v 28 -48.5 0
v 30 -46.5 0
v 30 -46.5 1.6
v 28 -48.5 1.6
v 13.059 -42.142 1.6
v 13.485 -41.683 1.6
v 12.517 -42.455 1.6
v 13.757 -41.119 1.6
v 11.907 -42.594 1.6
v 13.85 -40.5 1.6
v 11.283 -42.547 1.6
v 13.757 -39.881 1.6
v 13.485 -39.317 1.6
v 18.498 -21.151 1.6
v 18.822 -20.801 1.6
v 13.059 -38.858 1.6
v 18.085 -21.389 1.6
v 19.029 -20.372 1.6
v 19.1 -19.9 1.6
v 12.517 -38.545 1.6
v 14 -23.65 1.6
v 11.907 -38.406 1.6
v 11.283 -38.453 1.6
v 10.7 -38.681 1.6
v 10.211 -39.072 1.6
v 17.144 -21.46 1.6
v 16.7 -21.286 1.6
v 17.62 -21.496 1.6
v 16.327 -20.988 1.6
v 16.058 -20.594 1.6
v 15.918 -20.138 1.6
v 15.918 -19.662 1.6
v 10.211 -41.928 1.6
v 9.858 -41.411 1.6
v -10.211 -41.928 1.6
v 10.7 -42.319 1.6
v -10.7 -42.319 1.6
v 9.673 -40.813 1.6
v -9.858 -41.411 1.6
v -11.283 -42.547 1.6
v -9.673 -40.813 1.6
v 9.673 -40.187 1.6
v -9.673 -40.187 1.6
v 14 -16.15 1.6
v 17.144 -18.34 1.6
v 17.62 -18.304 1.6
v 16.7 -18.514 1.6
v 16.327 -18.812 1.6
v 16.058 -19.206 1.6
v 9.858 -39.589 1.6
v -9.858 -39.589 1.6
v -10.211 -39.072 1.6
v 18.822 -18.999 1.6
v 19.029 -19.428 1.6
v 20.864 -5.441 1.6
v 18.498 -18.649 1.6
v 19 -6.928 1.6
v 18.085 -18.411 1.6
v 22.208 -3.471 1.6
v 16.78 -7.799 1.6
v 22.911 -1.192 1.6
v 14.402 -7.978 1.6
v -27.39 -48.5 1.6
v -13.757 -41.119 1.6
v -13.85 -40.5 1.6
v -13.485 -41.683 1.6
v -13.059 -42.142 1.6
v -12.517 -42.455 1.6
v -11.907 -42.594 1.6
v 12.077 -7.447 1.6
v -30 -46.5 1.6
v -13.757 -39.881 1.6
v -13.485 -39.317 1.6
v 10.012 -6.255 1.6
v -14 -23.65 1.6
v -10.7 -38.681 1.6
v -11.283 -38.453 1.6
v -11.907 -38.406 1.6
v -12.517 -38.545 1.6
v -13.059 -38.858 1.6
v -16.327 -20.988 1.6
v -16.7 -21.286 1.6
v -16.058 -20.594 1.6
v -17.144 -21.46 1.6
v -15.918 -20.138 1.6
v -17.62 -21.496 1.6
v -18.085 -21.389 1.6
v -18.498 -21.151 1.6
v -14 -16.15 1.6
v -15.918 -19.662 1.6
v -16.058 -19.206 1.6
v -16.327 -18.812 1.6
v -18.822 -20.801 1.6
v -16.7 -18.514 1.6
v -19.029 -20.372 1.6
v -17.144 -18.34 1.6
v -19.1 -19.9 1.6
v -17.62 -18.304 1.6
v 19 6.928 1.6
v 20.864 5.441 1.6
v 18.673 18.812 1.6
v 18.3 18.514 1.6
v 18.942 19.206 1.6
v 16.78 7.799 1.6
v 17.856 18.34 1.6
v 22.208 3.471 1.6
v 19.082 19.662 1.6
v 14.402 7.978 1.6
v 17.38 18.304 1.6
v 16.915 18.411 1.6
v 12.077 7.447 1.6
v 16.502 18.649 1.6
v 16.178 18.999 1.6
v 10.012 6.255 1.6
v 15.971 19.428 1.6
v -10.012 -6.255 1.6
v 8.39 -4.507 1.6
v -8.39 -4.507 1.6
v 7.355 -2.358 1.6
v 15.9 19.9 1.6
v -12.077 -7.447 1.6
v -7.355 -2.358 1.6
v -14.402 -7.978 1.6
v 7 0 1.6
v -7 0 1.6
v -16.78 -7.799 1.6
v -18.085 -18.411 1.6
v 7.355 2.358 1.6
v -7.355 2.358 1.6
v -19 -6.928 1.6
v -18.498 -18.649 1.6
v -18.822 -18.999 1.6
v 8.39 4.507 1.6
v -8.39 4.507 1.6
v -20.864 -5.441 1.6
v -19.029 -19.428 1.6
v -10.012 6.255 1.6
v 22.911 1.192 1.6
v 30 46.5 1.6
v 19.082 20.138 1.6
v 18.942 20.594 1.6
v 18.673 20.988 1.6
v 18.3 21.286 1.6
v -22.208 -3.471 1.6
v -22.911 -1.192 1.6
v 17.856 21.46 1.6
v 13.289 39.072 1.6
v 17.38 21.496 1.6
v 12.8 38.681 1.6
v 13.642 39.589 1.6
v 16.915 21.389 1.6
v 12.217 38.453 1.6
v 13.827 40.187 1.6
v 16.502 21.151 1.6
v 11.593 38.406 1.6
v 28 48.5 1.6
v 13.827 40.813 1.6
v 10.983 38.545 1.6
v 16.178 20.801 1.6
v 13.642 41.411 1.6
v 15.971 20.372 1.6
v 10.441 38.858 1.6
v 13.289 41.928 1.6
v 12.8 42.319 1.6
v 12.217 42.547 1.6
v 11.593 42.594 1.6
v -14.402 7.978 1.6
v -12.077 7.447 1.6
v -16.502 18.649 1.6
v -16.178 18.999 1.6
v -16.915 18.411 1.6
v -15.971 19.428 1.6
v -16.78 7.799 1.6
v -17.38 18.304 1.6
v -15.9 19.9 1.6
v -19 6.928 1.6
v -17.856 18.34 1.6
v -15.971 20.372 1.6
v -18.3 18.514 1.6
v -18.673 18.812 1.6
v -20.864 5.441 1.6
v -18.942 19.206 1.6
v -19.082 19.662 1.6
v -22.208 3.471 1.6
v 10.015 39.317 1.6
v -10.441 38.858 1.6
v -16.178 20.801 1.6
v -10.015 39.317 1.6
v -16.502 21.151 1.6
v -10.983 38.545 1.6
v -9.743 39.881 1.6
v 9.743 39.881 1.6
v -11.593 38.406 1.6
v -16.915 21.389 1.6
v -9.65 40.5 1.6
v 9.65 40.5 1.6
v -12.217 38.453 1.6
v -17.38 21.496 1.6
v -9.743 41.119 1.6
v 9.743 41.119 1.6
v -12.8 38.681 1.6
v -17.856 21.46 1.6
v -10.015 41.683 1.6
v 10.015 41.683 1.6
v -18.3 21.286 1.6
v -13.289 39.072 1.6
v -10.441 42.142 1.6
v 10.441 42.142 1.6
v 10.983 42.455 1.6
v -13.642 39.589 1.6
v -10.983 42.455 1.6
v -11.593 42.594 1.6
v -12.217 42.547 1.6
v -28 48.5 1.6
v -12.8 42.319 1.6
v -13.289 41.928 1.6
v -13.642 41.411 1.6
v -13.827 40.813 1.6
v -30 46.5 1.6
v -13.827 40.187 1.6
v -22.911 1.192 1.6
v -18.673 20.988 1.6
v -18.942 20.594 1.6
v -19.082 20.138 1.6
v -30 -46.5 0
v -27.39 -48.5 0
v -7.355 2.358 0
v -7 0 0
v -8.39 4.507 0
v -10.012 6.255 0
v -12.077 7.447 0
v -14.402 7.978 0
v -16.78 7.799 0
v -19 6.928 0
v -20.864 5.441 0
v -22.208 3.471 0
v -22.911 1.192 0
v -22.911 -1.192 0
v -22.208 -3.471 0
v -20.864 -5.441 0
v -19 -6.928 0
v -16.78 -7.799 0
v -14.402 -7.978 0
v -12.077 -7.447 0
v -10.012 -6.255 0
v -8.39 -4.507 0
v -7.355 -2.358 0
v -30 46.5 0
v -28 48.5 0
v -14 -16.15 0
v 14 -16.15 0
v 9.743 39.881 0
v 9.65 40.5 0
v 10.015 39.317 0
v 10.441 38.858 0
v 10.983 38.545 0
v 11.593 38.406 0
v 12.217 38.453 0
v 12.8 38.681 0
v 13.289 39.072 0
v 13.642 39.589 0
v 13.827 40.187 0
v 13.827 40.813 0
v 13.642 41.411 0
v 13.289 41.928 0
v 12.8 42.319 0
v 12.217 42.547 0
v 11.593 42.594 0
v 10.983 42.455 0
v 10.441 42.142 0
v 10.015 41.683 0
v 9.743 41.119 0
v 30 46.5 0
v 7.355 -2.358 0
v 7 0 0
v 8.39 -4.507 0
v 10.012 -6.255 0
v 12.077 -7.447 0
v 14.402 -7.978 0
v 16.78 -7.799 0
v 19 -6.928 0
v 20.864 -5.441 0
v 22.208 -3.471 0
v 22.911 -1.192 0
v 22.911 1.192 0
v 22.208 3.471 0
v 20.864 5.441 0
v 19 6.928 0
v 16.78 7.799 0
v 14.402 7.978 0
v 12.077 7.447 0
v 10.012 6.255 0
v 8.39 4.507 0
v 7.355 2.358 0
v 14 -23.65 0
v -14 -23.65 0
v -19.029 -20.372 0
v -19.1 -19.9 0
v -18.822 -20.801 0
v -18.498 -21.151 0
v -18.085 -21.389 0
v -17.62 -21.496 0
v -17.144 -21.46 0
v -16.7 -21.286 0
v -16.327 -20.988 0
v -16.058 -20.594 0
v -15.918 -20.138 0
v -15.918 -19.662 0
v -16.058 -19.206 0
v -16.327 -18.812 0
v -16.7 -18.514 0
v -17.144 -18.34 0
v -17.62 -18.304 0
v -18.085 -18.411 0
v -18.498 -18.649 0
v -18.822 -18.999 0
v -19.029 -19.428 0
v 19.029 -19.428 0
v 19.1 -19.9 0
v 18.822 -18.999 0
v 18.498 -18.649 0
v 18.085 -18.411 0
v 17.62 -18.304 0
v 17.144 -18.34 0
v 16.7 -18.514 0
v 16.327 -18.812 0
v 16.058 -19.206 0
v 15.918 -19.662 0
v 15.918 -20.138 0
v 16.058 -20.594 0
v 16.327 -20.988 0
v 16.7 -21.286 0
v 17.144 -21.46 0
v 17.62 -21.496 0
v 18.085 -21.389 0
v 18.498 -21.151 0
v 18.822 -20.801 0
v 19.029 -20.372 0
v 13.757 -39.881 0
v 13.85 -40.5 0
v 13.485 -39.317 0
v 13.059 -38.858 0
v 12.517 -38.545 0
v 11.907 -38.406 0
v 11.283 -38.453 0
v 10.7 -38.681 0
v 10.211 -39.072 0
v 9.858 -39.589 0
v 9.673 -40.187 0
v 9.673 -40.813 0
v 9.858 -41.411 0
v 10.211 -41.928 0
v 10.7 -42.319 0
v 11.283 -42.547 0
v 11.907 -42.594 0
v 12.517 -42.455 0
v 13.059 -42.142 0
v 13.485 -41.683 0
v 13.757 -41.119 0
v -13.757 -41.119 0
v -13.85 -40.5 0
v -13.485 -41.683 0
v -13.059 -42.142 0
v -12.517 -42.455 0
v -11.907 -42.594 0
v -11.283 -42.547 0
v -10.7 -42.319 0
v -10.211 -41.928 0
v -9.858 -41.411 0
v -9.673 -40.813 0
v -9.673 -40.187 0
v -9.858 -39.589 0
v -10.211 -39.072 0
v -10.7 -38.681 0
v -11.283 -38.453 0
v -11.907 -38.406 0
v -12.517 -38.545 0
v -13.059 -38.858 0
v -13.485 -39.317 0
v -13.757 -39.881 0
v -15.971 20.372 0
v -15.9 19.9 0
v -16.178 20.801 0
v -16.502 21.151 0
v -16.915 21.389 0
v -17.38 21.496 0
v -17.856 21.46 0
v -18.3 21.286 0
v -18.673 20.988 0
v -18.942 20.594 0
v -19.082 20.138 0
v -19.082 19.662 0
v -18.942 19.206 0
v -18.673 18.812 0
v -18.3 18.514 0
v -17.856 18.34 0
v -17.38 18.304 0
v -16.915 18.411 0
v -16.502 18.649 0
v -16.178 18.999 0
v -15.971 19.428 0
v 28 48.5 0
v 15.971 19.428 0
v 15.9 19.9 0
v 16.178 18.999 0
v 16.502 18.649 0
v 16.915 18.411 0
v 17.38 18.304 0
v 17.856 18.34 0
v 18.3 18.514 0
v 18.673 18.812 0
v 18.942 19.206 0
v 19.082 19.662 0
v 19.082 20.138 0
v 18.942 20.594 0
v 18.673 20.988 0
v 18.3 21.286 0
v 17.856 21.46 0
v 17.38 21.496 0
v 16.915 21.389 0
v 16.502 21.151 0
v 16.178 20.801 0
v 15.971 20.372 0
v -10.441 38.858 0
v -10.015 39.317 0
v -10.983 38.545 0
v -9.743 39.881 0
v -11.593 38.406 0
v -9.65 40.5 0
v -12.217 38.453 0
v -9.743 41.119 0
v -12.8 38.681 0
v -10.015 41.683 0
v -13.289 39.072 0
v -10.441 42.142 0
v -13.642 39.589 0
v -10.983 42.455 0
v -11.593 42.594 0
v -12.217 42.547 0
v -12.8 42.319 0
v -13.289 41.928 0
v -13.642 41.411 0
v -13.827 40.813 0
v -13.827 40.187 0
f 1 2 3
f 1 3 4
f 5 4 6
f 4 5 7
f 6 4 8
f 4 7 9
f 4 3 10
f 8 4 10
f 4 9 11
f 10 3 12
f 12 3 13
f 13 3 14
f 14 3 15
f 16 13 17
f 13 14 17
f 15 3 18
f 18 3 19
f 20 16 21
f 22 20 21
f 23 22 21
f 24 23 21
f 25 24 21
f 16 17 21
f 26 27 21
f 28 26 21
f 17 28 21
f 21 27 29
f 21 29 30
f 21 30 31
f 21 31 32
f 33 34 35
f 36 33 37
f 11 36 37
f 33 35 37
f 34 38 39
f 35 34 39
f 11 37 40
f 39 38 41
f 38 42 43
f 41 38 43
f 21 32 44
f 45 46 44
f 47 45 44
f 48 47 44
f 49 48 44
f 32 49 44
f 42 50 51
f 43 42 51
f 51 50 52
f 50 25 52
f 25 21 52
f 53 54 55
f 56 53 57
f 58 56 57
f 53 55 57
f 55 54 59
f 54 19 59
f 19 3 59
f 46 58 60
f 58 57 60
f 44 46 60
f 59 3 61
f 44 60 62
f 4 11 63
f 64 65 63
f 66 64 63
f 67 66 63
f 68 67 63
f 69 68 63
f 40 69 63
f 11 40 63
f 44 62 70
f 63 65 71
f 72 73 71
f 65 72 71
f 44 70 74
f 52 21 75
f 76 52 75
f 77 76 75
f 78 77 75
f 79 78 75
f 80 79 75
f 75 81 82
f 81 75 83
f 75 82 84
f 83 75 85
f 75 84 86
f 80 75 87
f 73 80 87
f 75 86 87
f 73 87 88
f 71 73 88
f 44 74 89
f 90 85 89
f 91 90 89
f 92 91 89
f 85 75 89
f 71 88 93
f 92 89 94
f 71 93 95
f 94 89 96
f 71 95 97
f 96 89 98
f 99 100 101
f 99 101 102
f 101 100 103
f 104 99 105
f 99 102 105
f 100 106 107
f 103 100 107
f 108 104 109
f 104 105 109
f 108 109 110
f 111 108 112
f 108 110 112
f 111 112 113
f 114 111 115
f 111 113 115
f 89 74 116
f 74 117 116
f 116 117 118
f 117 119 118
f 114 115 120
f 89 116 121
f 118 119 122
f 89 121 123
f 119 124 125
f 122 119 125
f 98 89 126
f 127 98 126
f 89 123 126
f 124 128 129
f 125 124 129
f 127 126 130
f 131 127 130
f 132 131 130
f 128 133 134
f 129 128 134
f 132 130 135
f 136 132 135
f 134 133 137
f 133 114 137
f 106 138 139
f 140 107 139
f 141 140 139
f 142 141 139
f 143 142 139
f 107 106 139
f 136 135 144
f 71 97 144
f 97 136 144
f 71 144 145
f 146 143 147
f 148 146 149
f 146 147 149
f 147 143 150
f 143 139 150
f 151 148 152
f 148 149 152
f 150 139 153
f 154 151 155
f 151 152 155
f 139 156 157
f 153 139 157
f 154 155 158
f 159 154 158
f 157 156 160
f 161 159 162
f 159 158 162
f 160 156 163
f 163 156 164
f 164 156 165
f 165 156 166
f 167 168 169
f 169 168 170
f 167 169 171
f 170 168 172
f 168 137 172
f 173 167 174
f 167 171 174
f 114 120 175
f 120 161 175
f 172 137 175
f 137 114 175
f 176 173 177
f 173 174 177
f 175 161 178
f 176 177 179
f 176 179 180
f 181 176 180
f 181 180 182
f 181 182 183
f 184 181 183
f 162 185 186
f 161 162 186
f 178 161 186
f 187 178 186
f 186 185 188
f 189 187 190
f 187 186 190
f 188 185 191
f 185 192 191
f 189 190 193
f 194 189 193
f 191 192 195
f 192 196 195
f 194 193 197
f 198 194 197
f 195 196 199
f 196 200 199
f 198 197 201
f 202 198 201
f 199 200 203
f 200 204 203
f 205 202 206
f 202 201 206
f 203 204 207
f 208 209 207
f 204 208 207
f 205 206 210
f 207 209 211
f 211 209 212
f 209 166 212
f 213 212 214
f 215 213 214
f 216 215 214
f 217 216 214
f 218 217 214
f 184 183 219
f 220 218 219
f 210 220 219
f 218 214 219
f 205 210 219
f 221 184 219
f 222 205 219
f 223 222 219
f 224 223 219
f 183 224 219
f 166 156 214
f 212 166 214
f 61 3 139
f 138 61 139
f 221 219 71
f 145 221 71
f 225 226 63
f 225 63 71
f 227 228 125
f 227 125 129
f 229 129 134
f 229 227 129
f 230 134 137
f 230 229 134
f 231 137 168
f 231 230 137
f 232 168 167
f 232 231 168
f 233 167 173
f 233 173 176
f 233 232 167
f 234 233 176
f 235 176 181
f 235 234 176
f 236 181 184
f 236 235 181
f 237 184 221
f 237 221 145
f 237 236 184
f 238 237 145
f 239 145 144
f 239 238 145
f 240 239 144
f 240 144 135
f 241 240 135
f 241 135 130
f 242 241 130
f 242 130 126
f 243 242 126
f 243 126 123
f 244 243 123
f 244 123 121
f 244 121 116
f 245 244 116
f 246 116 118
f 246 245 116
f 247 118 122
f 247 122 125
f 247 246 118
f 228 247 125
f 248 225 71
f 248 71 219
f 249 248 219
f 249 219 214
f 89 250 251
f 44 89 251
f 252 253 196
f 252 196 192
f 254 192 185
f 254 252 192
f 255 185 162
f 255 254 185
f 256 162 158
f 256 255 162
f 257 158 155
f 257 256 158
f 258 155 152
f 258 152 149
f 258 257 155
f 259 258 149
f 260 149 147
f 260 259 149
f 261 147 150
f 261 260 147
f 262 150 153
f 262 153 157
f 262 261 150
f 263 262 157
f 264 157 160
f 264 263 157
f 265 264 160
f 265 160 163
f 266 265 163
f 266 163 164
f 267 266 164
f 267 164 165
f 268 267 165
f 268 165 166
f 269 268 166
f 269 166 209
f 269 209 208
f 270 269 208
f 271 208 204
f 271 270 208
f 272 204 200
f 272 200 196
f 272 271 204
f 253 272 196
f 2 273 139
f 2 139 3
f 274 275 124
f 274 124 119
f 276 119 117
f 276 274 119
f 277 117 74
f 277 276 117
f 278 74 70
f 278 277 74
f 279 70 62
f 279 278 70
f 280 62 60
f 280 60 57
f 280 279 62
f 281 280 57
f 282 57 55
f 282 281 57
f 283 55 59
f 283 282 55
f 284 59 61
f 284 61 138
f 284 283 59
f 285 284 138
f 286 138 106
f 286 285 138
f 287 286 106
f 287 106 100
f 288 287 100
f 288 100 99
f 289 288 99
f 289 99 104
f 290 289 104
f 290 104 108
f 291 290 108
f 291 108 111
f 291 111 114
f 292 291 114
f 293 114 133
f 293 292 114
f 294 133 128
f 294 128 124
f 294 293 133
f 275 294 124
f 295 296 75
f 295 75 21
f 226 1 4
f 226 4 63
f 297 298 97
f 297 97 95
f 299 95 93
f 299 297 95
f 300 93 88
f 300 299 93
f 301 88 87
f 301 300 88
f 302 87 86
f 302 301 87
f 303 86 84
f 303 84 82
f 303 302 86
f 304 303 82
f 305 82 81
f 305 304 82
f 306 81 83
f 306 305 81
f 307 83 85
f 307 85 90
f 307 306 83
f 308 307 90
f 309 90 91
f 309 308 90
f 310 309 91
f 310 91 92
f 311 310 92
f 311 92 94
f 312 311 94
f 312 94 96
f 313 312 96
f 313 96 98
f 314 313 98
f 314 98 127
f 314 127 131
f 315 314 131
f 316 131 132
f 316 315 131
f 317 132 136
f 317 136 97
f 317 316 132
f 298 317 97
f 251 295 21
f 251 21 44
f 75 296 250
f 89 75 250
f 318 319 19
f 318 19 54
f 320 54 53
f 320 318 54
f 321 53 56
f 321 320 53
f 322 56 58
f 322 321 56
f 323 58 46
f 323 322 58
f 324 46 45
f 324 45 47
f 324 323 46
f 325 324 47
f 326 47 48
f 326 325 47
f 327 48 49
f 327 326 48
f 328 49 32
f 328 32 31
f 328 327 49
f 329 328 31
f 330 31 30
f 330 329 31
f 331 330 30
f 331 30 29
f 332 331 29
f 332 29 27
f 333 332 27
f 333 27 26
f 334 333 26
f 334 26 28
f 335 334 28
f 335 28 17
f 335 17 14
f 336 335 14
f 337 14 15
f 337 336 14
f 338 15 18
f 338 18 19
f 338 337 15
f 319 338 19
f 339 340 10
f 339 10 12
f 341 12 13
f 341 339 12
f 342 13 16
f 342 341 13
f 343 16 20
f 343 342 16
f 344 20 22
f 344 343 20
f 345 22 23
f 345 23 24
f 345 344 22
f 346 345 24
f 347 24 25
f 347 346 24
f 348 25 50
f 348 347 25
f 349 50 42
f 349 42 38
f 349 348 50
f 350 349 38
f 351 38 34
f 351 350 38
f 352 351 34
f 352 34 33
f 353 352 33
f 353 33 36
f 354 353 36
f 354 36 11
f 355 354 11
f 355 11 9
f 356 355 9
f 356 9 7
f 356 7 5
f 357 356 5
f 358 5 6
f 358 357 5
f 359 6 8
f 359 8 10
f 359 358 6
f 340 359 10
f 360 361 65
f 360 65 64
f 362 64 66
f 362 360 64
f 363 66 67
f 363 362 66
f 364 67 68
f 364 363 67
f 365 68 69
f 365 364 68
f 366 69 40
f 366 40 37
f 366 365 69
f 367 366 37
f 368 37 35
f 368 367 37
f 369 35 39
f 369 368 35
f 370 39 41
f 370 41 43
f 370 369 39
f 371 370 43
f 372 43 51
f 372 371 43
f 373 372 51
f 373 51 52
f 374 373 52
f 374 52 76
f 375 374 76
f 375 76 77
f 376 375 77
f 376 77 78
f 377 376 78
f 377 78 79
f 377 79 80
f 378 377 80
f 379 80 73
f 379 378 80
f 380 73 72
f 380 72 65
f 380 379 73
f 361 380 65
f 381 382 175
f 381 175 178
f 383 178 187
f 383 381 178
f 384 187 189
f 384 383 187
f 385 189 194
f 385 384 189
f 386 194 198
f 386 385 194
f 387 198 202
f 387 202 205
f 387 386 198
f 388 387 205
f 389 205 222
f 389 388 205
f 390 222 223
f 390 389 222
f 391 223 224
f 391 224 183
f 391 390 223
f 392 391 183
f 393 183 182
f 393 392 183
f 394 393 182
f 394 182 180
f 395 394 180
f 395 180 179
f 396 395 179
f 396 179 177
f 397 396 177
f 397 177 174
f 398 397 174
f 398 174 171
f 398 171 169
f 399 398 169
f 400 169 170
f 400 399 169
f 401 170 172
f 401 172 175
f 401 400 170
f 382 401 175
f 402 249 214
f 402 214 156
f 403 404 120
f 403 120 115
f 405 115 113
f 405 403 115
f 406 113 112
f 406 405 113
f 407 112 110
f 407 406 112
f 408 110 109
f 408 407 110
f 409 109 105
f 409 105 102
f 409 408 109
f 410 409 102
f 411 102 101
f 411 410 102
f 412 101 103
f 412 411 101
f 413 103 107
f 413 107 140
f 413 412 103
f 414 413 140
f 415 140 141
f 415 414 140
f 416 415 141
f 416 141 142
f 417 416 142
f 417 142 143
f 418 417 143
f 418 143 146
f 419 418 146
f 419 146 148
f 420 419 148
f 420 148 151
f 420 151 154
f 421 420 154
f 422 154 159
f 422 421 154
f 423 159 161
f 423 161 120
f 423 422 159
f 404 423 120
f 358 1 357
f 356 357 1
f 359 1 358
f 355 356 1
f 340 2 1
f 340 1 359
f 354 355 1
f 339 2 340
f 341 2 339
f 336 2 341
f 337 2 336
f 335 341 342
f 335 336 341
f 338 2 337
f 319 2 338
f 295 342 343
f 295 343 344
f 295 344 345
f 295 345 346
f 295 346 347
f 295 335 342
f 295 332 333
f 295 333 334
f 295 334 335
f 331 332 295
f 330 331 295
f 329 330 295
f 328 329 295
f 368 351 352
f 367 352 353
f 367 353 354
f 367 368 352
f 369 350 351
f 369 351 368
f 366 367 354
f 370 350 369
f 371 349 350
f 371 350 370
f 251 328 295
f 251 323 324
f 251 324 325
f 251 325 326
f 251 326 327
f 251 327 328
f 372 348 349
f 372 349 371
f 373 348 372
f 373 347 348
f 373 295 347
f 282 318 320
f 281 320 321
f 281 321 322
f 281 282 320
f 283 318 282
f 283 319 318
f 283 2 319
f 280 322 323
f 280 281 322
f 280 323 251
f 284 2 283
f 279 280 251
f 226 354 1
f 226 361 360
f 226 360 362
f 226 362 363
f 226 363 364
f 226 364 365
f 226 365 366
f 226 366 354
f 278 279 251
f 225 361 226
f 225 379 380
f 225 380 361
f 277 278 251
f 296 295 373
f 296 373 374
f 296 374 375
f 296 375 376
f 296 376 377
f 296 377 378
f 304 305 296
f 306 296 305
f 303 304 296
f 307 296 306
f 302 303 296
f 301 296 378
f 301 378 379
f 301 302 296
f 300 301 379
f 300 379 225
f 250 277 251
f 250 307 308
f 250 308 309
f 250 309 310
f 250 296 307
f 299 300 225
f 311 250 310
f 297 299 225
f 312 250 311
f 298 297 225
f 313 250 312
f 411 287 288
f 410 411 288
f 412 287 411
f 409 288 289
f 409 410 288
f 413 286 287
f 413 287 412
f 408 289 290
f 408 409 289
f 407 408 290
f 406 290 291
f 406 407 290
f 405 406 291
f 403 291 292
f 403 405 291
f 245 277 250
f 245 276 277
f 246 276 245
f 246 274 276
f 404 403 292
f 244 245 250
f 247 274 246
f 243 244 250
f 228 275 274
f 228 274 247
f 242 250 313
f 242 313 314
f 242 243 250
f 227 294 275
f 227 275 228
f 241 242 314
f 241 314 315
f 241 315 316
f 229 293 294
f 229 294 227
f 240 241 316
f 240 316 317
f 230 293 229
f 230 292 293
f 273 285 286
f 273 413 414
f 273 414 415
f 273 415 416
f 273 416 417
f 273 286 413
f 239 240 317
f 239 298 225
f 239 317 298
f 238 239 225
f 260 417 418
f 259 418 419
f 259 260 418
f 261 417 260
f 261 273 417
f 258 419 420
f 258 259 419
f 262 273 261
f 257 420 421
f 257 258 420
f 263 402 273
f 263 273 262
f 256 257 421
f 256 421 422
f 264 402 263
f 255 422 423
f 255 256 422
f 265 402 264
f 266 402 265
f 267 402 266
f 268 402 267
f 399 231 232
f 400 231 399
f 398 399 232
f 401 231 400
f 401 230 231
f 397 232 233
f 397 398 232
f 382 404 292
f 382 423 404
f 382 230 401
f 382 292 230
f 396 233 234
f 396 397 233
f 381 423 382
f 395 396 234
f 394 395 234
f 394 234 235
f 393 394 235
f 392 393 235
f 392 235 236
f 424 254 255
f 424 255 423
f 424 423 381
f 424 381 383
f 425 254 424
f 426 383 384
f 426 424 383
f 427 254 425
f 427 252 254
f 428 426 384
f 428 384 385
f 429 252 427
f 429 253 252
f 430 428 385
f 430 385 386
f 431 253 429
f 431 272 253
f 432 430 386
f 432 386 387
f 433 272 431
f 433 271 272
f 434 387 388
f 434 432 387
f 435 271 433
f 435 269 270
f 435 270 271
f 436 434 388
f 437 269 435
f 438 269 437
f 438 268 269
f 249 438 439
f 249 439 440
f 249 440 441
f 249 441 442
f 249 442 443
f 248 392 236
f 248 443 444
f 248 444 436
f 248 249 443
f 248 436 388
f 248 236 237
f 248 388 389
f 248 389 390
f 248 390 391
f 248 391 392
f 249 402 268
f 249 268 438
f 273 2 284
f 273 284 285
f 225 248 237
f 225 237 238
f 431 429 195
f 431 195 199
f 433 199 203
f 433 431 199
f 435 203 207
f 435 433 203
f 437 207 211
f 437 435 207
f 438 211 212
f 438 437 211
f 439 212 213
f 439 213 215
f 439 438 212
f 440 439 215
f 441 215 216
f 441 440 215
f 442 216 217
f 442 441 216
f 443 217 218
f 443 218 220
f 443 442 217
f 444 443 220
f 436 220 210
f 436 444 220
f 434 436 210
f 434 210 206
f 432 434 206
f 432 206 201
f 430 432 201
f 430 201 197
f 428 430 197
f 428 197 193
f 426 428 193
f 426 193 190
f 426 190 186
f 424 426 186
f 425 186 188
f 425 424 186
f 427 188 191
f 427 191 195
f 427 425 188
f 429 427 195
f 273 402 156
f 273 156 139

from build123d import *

# Parameters (mm, degrees)
SKETCH_1_R      = 8
SKETCH_1_R_2    = 1.6
SKETCH_1_R_3    = 2.1
SKETCH_1_W      = 28
SKETCH_1_H      = 7.5
EXTRUDE_1_DEPTH = 1.6


with BuildPart() as part:
    # 草图1 → 凸台-拉伸1 (new body)
    with BuildSketch(Plane.XY):
        Polygon((-28, 48.5), (28, 48.5), (30, 46.5), (30, -46.5), (28, -48.5), (-27.38960578, -48.5), (-30, -46.5), (-30, 46.5), align=None)
        with Locations((-15, 0)):
            Circle(SKETCH_1_R, mode=Mode.SUBTRACT)
        with Locations((-17.5, 19.9)):
            Circle(SKETCH_1_R_2, mode=Mode.SUBTRACT)
        with Locations((-11.75, 40.5)):
            Circle(SKETCH_1_R_3, mode=Mode.SUBTRACT)
        with Locations(Location((-17.5, -19.9, 0), (0, 0, 180))):
            Circle(SKETCH_1_R_2, mode=Mode.SUBTRACT)
        with Locations(Location((-11.75, -40.5, 0), (0, 0, 180))):
            Circle(SKETCH_1_R_3, mode=Mode.SUBTRACT)
        with Locations(Location((17.5, 19.9, 0), (0, 0, 180))):
            Circle(SKETCH_1_R_2, mode=Mode.SUBTRACT)
        with Locations(Location((11.75, 40.5, 0), (0, 0, 180))):
            Circle(SKETCH_1_R_3, mode=Mode.SUBTRACT)
        with Locations((11.75, -40.5)):
            Circle(SKETCH_1_R_3, mode=Mode.SUBTRACT)
        with Locations((17.5, -19.9)):
            Circle(SKETCH_1_R_2, mode=Mode.SUBTRACT)
        with Locations(Location((15, 0, 0), (0, 0, 180))):
            Circle(SKETCH_1_R, mode=Mode.SUBTRACT)
        with Locations((0, -19.9)):
            Rectangle(SKETCH_1_W, SKETCH_1_H, mode=Mode.SUBTRACT)
    extrude(amount=EXTRUDE_1_DEPTH)


solid = part.part
